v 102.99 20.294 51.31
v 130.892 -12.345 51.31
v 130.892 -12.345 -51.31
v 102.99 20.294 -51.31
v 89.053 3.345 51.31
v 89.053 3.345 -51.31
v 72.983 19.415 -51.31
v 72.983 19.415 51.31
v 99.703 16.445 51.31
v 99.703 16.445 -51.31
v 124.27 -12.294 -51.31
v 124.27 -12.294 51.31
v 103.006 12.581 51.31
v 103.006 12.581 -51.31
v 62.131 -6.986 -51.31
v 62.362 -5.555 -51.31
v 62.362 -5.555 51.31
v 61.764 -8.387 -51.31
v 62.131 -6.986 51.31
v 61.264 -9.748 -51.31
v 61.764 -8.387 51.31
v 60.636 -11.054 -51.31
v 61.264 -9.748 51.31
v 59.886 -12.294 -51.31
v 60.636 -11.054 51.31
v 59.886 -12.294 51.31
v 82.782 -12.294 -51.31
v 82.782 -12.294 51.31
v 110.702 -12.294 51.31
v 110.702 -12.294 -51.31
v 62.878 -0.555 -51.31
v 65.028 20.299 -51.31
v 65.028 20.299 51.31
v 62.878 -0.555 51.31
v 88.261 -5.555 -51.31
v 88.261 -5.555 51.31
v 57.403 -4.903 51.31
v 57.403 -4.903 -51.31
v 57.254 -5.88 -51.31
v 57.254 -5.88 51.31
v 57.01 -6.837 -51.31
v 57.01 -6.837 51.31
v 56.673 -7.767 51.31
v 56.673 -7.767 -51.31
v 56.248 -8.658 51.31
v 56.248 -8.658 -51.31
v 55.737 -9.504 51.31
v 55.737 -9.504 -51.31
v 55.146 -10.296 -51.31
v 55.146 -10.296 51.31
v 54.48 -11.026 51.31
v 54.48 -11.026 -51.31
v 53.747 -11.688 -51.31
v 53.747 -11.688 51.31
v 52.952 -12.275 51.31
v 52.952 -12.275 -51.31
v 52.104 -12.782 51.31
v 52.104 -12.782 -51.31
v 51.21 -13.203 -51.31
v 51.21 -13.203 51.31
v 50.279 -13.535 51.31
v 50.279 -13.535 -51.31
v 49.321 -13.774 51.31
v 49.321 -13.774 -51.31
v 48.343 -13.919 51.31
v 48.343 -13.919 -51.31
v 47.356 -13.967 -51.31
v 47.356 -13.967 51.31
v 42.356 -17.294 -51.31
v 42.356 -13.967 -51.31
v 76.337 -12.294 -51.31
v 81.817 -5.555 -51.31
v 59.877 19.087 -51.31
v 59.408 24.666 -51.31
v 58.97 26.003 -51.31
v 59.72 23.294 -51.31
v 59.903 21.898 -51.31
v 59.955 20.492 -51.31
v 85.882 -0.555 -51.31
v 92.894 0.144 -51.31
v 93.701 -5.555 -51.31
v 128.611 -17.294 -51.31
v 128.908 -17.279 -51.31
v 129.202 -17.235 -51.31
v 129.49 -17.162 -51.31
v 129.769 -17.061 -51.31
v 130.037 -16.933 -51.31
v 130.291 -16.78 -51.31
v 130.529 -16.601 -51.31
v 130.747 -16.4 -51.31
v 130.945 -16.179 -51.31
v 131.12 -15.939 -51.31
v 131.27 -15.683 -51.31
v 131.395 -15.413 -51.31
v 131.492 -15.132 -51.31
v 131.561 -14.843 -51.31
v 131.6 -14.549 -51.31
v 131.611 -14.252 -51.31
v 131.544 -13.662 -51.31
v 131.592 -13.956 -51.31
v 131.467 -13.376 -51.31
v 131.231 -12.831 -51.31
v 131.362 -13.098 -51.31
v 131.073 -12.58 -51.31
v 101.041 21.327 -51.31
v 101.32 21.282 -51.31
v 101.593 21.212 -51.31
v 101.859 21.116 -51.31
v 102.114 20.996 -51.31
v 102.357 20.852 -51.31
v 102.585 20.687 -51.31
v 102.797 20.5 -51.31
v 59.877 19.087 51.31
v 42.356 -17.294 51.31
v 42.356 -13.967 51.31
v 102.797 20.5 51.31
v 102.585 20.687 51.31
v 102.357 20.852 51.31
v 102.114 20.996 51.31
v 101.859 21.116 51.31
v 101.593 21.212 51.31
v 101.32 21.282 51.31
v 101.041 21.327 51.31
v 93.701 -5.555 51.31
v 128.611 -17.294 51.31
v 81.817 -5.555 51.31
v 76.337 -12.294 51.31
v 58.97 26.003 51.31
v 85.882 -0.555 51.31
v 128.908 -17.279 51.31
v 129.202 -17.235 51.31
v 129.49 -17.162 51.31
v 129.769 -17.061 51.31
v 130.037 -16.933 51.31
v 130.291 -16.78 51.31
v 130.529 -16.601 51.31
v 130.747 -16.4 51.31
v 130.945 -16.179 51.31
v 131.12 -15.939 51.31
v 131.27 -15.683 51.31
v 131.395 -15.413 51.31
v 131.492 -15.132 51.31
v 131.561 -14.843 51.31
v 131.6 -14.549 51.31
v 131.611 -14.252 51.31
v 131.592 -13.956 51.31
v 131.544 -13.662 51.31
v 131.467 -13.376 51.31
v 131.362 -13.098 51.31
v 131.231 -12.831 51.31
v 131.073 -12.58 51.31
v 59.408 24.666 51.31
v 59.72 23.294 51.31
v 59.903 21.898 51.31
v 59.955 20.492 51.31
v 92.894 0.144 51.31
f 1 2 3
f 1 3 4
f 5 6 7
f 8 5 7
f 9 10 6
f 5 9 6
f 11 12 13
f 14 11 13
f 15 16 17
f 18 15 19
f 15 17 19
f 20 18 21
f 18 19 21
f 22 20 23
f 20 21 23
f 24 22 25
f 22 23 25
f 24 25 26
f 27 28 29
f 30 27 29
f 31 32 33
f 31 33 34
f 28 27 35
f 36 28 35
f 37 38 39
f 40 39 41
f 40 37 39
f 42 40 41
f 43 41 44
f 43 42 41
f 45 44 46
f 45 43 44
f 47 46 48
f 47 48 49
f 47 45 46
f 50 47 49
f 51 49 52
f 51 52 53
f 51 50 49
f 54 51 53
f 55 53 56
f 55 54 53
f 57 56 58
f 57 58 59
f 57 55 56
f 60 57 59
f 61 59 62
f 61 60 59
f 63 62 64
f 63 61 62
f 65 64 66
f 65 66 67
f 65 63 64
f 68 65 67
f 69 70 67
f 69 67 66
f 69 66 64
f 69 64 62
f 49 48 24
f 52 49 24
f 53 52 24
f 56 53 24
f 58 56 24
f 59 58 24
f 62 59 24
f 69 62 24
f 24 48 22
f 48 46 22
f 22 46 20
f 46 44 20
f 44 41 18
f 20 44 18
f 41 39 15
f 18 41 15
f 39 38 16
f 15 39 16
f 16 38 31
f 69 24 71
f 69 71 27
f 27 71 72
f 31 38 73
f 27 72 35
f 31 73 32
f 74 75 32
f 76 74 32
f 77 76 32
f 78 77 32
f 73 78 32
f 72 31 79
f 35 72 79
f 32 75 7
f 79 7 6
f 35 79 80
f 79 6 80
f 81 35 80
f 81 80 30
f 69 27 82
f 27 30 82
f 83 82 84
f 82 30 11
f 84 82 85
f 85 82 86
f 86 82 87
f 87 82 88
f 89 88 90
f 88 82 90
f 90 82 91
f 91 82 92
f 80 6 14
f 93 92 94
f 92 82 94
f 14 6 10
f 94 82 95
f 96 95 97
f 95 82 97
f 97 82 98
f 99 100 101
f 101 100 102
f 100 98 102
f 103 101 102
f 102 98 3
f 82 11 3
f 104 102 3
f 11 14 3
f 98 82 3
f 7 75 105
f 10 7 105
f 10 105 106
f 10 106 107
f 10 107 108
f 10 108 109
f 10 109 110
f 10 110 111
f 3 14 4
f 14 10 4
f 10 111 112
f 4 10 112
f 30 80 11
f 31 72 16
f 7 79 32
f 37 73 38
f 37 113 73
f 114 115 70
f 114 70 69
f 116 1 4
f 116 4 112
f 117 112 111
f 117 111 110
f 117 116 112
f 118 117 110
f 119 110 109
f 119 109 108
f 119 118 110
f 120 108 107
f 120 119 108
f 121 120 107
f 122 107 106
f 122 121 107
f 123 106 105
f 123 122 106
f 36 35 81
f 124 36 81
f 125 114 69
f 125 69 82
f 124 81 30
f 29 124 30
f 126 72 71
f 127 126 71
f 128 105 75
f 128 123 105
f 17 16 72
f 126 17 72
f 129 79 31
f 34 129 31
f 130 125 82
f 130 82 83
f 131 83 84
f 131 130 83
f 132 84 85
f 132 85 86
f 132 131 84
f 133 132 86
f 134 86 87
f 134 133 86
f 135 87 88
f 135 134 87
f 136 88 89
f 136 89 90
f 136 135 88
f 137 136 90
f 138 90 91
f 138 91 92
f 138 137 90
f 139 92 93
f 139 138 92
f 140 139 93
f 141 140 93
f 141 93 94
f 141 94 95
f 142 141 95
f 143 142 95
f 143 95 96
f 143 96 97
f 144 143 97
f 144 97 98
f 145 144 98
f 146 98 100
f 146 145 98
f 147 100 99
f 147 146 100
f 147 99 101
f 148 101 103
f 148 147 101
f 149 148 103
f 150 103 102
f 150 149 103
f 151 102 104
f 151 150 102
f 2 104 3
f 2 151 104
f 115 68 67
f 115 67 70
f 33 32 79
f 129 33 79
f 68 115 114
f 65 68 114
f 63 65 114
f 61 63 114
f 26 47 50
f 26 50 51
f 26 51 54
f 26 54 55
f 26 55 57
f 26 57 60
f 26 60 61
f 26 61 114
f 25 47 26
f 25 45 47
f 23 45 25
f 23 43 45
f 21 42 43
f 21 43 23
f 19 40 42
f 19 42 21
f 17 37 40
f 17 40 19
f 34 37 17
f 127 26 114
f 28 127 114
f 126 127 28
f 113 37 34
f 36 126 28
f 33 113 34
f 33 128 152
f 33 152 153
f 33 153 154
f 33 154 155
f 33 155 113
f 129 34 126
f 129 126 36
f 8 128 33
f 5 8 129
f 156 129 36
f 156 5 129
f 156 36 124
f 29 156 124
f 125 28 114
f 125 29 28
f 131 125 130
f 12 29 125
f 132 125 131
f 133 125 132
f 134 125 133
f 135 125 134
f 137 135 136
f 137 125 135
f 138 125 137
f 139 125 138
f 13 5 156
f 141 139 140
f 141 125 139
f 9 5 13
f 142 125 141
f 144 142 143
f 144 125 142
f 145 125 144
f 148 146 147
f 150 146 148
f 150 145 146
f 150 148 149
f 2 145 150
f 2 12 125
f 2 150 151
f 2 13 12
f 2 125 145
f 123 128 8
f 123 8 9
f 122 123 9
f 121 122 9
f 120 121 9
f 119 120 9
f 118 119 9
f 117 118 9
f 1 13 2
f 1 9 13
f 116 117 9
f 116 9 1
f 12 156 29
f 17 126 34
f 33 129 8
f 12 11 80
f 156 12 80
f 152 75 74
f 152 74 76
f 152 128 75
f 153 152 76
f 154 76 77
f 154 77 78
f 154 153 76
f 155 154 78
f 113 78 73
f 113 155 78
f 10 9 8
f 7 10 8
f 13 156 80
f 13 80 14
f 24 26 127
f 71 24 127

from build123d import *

# Parameters (mm, degrees)
BOSS_EXTRUDE1_DEPTH = 51.31
CUT_EXTRUDE1_DEPTH  = 169.903952009
EXTRUDE_THIN1_START = -51.31
EXTRUDE_THIN1_DEPTH = 102.62


with BuildPart() as part:
    # Sketch1 → Boss-Extrude1 (new, symmetric)
    with BuildSketch(Plane.XY):
        with BuildLine():
            Line((59.876515773, 19.086695264), (57.402885491, -4.903230804))
            ThreePointArc((57.402885491, -4.903230804), (54.121767552, -11.36639665), (47.356152322, -13.9673))
            Line((47.356152322, -13.9673), (42.356152322, -13.9673))
            Line((42.356152322, -13.9673), (42.356152322, -17.293867679))
            Line((42.356152322, -17.293867679), (128.611229128, -17.293867679))
            ThreePointArc((128.611229128, -17.293867679), (131.335936638, -15.549243714), (130.891584134, -12.344513672))
            Line((130.891584134, -12.344513672), (102.990355006, 20.294354008))
            ThreePointArc((102.990355006, 20.294354008), (102.114192176, 20.996083615), (101.041429063, 21.326636258))
            Line((101.041429063, 21.326636258), (58.969893766, 26.003172338))
            ThreePointArc((58.969893766, 26.003172338), (59.828073734, 22.598004621), (59.876515773, 19.086695264))
        make_face()
    extrude(amount=BOSS_EXTRUDE1_DEPTH, both=True)

    # Sketch2 → Cut-Extrude1 (cut, through all)
    with BuildSketch(Plane.XY.offset(51.31)):
        with BuildLine():
            Line((65.02802496, 20.298975288), (62.376515773, -5.416067836))
            ThreePointArc((62.376515773, -5.416067836), (61.55413792, -9.00803973), (59.886234411, -12.293867679))
            Line((59.886234411, -12.293867679), (124.270366416, -12.293867679))
            Line((124.270366416, -12.293867679), (99.70340547, 16.444571904))
            Line((99.70340547, 16.444571904), (65.02802496, 20.298975288))
        make_face()
    extrude(amount=-CUT_EXTRUDE1_DEPTH, mode=Mode.SUBTRACT)

    # Sketch3 → Extrude-Thin1 (add)
    with BuildSketch(Plane.XY.offset(EXTRUDE_THIN1_START)):
        Polygon((99.70340547, 16.444571904), (76.337464228, -12.293867679), (80.216979633, -15.448128325), (103.582920875, 13.290311258), align=None)
        Polygon((124.270366416, -12.293867679), (88.020434849, 2.075352112), (86.177943711, -2.572790141), (122.427875278, -16.942009933), align=None)
        Polygon((65.02802496, 20.298975288), (85.881897007, -0.554896759), (62.877757, -0.554896759), (59.886234411, -0.554896759), (59.886234411, -5.554896759), (62.877757, -5.554896759), (97.952964819, -5.554896759), (68.563558866, 23.834509194), align=None)
    extrude(amount=EXTRUDE_THIN1_DEPTH)


solid = part.part
